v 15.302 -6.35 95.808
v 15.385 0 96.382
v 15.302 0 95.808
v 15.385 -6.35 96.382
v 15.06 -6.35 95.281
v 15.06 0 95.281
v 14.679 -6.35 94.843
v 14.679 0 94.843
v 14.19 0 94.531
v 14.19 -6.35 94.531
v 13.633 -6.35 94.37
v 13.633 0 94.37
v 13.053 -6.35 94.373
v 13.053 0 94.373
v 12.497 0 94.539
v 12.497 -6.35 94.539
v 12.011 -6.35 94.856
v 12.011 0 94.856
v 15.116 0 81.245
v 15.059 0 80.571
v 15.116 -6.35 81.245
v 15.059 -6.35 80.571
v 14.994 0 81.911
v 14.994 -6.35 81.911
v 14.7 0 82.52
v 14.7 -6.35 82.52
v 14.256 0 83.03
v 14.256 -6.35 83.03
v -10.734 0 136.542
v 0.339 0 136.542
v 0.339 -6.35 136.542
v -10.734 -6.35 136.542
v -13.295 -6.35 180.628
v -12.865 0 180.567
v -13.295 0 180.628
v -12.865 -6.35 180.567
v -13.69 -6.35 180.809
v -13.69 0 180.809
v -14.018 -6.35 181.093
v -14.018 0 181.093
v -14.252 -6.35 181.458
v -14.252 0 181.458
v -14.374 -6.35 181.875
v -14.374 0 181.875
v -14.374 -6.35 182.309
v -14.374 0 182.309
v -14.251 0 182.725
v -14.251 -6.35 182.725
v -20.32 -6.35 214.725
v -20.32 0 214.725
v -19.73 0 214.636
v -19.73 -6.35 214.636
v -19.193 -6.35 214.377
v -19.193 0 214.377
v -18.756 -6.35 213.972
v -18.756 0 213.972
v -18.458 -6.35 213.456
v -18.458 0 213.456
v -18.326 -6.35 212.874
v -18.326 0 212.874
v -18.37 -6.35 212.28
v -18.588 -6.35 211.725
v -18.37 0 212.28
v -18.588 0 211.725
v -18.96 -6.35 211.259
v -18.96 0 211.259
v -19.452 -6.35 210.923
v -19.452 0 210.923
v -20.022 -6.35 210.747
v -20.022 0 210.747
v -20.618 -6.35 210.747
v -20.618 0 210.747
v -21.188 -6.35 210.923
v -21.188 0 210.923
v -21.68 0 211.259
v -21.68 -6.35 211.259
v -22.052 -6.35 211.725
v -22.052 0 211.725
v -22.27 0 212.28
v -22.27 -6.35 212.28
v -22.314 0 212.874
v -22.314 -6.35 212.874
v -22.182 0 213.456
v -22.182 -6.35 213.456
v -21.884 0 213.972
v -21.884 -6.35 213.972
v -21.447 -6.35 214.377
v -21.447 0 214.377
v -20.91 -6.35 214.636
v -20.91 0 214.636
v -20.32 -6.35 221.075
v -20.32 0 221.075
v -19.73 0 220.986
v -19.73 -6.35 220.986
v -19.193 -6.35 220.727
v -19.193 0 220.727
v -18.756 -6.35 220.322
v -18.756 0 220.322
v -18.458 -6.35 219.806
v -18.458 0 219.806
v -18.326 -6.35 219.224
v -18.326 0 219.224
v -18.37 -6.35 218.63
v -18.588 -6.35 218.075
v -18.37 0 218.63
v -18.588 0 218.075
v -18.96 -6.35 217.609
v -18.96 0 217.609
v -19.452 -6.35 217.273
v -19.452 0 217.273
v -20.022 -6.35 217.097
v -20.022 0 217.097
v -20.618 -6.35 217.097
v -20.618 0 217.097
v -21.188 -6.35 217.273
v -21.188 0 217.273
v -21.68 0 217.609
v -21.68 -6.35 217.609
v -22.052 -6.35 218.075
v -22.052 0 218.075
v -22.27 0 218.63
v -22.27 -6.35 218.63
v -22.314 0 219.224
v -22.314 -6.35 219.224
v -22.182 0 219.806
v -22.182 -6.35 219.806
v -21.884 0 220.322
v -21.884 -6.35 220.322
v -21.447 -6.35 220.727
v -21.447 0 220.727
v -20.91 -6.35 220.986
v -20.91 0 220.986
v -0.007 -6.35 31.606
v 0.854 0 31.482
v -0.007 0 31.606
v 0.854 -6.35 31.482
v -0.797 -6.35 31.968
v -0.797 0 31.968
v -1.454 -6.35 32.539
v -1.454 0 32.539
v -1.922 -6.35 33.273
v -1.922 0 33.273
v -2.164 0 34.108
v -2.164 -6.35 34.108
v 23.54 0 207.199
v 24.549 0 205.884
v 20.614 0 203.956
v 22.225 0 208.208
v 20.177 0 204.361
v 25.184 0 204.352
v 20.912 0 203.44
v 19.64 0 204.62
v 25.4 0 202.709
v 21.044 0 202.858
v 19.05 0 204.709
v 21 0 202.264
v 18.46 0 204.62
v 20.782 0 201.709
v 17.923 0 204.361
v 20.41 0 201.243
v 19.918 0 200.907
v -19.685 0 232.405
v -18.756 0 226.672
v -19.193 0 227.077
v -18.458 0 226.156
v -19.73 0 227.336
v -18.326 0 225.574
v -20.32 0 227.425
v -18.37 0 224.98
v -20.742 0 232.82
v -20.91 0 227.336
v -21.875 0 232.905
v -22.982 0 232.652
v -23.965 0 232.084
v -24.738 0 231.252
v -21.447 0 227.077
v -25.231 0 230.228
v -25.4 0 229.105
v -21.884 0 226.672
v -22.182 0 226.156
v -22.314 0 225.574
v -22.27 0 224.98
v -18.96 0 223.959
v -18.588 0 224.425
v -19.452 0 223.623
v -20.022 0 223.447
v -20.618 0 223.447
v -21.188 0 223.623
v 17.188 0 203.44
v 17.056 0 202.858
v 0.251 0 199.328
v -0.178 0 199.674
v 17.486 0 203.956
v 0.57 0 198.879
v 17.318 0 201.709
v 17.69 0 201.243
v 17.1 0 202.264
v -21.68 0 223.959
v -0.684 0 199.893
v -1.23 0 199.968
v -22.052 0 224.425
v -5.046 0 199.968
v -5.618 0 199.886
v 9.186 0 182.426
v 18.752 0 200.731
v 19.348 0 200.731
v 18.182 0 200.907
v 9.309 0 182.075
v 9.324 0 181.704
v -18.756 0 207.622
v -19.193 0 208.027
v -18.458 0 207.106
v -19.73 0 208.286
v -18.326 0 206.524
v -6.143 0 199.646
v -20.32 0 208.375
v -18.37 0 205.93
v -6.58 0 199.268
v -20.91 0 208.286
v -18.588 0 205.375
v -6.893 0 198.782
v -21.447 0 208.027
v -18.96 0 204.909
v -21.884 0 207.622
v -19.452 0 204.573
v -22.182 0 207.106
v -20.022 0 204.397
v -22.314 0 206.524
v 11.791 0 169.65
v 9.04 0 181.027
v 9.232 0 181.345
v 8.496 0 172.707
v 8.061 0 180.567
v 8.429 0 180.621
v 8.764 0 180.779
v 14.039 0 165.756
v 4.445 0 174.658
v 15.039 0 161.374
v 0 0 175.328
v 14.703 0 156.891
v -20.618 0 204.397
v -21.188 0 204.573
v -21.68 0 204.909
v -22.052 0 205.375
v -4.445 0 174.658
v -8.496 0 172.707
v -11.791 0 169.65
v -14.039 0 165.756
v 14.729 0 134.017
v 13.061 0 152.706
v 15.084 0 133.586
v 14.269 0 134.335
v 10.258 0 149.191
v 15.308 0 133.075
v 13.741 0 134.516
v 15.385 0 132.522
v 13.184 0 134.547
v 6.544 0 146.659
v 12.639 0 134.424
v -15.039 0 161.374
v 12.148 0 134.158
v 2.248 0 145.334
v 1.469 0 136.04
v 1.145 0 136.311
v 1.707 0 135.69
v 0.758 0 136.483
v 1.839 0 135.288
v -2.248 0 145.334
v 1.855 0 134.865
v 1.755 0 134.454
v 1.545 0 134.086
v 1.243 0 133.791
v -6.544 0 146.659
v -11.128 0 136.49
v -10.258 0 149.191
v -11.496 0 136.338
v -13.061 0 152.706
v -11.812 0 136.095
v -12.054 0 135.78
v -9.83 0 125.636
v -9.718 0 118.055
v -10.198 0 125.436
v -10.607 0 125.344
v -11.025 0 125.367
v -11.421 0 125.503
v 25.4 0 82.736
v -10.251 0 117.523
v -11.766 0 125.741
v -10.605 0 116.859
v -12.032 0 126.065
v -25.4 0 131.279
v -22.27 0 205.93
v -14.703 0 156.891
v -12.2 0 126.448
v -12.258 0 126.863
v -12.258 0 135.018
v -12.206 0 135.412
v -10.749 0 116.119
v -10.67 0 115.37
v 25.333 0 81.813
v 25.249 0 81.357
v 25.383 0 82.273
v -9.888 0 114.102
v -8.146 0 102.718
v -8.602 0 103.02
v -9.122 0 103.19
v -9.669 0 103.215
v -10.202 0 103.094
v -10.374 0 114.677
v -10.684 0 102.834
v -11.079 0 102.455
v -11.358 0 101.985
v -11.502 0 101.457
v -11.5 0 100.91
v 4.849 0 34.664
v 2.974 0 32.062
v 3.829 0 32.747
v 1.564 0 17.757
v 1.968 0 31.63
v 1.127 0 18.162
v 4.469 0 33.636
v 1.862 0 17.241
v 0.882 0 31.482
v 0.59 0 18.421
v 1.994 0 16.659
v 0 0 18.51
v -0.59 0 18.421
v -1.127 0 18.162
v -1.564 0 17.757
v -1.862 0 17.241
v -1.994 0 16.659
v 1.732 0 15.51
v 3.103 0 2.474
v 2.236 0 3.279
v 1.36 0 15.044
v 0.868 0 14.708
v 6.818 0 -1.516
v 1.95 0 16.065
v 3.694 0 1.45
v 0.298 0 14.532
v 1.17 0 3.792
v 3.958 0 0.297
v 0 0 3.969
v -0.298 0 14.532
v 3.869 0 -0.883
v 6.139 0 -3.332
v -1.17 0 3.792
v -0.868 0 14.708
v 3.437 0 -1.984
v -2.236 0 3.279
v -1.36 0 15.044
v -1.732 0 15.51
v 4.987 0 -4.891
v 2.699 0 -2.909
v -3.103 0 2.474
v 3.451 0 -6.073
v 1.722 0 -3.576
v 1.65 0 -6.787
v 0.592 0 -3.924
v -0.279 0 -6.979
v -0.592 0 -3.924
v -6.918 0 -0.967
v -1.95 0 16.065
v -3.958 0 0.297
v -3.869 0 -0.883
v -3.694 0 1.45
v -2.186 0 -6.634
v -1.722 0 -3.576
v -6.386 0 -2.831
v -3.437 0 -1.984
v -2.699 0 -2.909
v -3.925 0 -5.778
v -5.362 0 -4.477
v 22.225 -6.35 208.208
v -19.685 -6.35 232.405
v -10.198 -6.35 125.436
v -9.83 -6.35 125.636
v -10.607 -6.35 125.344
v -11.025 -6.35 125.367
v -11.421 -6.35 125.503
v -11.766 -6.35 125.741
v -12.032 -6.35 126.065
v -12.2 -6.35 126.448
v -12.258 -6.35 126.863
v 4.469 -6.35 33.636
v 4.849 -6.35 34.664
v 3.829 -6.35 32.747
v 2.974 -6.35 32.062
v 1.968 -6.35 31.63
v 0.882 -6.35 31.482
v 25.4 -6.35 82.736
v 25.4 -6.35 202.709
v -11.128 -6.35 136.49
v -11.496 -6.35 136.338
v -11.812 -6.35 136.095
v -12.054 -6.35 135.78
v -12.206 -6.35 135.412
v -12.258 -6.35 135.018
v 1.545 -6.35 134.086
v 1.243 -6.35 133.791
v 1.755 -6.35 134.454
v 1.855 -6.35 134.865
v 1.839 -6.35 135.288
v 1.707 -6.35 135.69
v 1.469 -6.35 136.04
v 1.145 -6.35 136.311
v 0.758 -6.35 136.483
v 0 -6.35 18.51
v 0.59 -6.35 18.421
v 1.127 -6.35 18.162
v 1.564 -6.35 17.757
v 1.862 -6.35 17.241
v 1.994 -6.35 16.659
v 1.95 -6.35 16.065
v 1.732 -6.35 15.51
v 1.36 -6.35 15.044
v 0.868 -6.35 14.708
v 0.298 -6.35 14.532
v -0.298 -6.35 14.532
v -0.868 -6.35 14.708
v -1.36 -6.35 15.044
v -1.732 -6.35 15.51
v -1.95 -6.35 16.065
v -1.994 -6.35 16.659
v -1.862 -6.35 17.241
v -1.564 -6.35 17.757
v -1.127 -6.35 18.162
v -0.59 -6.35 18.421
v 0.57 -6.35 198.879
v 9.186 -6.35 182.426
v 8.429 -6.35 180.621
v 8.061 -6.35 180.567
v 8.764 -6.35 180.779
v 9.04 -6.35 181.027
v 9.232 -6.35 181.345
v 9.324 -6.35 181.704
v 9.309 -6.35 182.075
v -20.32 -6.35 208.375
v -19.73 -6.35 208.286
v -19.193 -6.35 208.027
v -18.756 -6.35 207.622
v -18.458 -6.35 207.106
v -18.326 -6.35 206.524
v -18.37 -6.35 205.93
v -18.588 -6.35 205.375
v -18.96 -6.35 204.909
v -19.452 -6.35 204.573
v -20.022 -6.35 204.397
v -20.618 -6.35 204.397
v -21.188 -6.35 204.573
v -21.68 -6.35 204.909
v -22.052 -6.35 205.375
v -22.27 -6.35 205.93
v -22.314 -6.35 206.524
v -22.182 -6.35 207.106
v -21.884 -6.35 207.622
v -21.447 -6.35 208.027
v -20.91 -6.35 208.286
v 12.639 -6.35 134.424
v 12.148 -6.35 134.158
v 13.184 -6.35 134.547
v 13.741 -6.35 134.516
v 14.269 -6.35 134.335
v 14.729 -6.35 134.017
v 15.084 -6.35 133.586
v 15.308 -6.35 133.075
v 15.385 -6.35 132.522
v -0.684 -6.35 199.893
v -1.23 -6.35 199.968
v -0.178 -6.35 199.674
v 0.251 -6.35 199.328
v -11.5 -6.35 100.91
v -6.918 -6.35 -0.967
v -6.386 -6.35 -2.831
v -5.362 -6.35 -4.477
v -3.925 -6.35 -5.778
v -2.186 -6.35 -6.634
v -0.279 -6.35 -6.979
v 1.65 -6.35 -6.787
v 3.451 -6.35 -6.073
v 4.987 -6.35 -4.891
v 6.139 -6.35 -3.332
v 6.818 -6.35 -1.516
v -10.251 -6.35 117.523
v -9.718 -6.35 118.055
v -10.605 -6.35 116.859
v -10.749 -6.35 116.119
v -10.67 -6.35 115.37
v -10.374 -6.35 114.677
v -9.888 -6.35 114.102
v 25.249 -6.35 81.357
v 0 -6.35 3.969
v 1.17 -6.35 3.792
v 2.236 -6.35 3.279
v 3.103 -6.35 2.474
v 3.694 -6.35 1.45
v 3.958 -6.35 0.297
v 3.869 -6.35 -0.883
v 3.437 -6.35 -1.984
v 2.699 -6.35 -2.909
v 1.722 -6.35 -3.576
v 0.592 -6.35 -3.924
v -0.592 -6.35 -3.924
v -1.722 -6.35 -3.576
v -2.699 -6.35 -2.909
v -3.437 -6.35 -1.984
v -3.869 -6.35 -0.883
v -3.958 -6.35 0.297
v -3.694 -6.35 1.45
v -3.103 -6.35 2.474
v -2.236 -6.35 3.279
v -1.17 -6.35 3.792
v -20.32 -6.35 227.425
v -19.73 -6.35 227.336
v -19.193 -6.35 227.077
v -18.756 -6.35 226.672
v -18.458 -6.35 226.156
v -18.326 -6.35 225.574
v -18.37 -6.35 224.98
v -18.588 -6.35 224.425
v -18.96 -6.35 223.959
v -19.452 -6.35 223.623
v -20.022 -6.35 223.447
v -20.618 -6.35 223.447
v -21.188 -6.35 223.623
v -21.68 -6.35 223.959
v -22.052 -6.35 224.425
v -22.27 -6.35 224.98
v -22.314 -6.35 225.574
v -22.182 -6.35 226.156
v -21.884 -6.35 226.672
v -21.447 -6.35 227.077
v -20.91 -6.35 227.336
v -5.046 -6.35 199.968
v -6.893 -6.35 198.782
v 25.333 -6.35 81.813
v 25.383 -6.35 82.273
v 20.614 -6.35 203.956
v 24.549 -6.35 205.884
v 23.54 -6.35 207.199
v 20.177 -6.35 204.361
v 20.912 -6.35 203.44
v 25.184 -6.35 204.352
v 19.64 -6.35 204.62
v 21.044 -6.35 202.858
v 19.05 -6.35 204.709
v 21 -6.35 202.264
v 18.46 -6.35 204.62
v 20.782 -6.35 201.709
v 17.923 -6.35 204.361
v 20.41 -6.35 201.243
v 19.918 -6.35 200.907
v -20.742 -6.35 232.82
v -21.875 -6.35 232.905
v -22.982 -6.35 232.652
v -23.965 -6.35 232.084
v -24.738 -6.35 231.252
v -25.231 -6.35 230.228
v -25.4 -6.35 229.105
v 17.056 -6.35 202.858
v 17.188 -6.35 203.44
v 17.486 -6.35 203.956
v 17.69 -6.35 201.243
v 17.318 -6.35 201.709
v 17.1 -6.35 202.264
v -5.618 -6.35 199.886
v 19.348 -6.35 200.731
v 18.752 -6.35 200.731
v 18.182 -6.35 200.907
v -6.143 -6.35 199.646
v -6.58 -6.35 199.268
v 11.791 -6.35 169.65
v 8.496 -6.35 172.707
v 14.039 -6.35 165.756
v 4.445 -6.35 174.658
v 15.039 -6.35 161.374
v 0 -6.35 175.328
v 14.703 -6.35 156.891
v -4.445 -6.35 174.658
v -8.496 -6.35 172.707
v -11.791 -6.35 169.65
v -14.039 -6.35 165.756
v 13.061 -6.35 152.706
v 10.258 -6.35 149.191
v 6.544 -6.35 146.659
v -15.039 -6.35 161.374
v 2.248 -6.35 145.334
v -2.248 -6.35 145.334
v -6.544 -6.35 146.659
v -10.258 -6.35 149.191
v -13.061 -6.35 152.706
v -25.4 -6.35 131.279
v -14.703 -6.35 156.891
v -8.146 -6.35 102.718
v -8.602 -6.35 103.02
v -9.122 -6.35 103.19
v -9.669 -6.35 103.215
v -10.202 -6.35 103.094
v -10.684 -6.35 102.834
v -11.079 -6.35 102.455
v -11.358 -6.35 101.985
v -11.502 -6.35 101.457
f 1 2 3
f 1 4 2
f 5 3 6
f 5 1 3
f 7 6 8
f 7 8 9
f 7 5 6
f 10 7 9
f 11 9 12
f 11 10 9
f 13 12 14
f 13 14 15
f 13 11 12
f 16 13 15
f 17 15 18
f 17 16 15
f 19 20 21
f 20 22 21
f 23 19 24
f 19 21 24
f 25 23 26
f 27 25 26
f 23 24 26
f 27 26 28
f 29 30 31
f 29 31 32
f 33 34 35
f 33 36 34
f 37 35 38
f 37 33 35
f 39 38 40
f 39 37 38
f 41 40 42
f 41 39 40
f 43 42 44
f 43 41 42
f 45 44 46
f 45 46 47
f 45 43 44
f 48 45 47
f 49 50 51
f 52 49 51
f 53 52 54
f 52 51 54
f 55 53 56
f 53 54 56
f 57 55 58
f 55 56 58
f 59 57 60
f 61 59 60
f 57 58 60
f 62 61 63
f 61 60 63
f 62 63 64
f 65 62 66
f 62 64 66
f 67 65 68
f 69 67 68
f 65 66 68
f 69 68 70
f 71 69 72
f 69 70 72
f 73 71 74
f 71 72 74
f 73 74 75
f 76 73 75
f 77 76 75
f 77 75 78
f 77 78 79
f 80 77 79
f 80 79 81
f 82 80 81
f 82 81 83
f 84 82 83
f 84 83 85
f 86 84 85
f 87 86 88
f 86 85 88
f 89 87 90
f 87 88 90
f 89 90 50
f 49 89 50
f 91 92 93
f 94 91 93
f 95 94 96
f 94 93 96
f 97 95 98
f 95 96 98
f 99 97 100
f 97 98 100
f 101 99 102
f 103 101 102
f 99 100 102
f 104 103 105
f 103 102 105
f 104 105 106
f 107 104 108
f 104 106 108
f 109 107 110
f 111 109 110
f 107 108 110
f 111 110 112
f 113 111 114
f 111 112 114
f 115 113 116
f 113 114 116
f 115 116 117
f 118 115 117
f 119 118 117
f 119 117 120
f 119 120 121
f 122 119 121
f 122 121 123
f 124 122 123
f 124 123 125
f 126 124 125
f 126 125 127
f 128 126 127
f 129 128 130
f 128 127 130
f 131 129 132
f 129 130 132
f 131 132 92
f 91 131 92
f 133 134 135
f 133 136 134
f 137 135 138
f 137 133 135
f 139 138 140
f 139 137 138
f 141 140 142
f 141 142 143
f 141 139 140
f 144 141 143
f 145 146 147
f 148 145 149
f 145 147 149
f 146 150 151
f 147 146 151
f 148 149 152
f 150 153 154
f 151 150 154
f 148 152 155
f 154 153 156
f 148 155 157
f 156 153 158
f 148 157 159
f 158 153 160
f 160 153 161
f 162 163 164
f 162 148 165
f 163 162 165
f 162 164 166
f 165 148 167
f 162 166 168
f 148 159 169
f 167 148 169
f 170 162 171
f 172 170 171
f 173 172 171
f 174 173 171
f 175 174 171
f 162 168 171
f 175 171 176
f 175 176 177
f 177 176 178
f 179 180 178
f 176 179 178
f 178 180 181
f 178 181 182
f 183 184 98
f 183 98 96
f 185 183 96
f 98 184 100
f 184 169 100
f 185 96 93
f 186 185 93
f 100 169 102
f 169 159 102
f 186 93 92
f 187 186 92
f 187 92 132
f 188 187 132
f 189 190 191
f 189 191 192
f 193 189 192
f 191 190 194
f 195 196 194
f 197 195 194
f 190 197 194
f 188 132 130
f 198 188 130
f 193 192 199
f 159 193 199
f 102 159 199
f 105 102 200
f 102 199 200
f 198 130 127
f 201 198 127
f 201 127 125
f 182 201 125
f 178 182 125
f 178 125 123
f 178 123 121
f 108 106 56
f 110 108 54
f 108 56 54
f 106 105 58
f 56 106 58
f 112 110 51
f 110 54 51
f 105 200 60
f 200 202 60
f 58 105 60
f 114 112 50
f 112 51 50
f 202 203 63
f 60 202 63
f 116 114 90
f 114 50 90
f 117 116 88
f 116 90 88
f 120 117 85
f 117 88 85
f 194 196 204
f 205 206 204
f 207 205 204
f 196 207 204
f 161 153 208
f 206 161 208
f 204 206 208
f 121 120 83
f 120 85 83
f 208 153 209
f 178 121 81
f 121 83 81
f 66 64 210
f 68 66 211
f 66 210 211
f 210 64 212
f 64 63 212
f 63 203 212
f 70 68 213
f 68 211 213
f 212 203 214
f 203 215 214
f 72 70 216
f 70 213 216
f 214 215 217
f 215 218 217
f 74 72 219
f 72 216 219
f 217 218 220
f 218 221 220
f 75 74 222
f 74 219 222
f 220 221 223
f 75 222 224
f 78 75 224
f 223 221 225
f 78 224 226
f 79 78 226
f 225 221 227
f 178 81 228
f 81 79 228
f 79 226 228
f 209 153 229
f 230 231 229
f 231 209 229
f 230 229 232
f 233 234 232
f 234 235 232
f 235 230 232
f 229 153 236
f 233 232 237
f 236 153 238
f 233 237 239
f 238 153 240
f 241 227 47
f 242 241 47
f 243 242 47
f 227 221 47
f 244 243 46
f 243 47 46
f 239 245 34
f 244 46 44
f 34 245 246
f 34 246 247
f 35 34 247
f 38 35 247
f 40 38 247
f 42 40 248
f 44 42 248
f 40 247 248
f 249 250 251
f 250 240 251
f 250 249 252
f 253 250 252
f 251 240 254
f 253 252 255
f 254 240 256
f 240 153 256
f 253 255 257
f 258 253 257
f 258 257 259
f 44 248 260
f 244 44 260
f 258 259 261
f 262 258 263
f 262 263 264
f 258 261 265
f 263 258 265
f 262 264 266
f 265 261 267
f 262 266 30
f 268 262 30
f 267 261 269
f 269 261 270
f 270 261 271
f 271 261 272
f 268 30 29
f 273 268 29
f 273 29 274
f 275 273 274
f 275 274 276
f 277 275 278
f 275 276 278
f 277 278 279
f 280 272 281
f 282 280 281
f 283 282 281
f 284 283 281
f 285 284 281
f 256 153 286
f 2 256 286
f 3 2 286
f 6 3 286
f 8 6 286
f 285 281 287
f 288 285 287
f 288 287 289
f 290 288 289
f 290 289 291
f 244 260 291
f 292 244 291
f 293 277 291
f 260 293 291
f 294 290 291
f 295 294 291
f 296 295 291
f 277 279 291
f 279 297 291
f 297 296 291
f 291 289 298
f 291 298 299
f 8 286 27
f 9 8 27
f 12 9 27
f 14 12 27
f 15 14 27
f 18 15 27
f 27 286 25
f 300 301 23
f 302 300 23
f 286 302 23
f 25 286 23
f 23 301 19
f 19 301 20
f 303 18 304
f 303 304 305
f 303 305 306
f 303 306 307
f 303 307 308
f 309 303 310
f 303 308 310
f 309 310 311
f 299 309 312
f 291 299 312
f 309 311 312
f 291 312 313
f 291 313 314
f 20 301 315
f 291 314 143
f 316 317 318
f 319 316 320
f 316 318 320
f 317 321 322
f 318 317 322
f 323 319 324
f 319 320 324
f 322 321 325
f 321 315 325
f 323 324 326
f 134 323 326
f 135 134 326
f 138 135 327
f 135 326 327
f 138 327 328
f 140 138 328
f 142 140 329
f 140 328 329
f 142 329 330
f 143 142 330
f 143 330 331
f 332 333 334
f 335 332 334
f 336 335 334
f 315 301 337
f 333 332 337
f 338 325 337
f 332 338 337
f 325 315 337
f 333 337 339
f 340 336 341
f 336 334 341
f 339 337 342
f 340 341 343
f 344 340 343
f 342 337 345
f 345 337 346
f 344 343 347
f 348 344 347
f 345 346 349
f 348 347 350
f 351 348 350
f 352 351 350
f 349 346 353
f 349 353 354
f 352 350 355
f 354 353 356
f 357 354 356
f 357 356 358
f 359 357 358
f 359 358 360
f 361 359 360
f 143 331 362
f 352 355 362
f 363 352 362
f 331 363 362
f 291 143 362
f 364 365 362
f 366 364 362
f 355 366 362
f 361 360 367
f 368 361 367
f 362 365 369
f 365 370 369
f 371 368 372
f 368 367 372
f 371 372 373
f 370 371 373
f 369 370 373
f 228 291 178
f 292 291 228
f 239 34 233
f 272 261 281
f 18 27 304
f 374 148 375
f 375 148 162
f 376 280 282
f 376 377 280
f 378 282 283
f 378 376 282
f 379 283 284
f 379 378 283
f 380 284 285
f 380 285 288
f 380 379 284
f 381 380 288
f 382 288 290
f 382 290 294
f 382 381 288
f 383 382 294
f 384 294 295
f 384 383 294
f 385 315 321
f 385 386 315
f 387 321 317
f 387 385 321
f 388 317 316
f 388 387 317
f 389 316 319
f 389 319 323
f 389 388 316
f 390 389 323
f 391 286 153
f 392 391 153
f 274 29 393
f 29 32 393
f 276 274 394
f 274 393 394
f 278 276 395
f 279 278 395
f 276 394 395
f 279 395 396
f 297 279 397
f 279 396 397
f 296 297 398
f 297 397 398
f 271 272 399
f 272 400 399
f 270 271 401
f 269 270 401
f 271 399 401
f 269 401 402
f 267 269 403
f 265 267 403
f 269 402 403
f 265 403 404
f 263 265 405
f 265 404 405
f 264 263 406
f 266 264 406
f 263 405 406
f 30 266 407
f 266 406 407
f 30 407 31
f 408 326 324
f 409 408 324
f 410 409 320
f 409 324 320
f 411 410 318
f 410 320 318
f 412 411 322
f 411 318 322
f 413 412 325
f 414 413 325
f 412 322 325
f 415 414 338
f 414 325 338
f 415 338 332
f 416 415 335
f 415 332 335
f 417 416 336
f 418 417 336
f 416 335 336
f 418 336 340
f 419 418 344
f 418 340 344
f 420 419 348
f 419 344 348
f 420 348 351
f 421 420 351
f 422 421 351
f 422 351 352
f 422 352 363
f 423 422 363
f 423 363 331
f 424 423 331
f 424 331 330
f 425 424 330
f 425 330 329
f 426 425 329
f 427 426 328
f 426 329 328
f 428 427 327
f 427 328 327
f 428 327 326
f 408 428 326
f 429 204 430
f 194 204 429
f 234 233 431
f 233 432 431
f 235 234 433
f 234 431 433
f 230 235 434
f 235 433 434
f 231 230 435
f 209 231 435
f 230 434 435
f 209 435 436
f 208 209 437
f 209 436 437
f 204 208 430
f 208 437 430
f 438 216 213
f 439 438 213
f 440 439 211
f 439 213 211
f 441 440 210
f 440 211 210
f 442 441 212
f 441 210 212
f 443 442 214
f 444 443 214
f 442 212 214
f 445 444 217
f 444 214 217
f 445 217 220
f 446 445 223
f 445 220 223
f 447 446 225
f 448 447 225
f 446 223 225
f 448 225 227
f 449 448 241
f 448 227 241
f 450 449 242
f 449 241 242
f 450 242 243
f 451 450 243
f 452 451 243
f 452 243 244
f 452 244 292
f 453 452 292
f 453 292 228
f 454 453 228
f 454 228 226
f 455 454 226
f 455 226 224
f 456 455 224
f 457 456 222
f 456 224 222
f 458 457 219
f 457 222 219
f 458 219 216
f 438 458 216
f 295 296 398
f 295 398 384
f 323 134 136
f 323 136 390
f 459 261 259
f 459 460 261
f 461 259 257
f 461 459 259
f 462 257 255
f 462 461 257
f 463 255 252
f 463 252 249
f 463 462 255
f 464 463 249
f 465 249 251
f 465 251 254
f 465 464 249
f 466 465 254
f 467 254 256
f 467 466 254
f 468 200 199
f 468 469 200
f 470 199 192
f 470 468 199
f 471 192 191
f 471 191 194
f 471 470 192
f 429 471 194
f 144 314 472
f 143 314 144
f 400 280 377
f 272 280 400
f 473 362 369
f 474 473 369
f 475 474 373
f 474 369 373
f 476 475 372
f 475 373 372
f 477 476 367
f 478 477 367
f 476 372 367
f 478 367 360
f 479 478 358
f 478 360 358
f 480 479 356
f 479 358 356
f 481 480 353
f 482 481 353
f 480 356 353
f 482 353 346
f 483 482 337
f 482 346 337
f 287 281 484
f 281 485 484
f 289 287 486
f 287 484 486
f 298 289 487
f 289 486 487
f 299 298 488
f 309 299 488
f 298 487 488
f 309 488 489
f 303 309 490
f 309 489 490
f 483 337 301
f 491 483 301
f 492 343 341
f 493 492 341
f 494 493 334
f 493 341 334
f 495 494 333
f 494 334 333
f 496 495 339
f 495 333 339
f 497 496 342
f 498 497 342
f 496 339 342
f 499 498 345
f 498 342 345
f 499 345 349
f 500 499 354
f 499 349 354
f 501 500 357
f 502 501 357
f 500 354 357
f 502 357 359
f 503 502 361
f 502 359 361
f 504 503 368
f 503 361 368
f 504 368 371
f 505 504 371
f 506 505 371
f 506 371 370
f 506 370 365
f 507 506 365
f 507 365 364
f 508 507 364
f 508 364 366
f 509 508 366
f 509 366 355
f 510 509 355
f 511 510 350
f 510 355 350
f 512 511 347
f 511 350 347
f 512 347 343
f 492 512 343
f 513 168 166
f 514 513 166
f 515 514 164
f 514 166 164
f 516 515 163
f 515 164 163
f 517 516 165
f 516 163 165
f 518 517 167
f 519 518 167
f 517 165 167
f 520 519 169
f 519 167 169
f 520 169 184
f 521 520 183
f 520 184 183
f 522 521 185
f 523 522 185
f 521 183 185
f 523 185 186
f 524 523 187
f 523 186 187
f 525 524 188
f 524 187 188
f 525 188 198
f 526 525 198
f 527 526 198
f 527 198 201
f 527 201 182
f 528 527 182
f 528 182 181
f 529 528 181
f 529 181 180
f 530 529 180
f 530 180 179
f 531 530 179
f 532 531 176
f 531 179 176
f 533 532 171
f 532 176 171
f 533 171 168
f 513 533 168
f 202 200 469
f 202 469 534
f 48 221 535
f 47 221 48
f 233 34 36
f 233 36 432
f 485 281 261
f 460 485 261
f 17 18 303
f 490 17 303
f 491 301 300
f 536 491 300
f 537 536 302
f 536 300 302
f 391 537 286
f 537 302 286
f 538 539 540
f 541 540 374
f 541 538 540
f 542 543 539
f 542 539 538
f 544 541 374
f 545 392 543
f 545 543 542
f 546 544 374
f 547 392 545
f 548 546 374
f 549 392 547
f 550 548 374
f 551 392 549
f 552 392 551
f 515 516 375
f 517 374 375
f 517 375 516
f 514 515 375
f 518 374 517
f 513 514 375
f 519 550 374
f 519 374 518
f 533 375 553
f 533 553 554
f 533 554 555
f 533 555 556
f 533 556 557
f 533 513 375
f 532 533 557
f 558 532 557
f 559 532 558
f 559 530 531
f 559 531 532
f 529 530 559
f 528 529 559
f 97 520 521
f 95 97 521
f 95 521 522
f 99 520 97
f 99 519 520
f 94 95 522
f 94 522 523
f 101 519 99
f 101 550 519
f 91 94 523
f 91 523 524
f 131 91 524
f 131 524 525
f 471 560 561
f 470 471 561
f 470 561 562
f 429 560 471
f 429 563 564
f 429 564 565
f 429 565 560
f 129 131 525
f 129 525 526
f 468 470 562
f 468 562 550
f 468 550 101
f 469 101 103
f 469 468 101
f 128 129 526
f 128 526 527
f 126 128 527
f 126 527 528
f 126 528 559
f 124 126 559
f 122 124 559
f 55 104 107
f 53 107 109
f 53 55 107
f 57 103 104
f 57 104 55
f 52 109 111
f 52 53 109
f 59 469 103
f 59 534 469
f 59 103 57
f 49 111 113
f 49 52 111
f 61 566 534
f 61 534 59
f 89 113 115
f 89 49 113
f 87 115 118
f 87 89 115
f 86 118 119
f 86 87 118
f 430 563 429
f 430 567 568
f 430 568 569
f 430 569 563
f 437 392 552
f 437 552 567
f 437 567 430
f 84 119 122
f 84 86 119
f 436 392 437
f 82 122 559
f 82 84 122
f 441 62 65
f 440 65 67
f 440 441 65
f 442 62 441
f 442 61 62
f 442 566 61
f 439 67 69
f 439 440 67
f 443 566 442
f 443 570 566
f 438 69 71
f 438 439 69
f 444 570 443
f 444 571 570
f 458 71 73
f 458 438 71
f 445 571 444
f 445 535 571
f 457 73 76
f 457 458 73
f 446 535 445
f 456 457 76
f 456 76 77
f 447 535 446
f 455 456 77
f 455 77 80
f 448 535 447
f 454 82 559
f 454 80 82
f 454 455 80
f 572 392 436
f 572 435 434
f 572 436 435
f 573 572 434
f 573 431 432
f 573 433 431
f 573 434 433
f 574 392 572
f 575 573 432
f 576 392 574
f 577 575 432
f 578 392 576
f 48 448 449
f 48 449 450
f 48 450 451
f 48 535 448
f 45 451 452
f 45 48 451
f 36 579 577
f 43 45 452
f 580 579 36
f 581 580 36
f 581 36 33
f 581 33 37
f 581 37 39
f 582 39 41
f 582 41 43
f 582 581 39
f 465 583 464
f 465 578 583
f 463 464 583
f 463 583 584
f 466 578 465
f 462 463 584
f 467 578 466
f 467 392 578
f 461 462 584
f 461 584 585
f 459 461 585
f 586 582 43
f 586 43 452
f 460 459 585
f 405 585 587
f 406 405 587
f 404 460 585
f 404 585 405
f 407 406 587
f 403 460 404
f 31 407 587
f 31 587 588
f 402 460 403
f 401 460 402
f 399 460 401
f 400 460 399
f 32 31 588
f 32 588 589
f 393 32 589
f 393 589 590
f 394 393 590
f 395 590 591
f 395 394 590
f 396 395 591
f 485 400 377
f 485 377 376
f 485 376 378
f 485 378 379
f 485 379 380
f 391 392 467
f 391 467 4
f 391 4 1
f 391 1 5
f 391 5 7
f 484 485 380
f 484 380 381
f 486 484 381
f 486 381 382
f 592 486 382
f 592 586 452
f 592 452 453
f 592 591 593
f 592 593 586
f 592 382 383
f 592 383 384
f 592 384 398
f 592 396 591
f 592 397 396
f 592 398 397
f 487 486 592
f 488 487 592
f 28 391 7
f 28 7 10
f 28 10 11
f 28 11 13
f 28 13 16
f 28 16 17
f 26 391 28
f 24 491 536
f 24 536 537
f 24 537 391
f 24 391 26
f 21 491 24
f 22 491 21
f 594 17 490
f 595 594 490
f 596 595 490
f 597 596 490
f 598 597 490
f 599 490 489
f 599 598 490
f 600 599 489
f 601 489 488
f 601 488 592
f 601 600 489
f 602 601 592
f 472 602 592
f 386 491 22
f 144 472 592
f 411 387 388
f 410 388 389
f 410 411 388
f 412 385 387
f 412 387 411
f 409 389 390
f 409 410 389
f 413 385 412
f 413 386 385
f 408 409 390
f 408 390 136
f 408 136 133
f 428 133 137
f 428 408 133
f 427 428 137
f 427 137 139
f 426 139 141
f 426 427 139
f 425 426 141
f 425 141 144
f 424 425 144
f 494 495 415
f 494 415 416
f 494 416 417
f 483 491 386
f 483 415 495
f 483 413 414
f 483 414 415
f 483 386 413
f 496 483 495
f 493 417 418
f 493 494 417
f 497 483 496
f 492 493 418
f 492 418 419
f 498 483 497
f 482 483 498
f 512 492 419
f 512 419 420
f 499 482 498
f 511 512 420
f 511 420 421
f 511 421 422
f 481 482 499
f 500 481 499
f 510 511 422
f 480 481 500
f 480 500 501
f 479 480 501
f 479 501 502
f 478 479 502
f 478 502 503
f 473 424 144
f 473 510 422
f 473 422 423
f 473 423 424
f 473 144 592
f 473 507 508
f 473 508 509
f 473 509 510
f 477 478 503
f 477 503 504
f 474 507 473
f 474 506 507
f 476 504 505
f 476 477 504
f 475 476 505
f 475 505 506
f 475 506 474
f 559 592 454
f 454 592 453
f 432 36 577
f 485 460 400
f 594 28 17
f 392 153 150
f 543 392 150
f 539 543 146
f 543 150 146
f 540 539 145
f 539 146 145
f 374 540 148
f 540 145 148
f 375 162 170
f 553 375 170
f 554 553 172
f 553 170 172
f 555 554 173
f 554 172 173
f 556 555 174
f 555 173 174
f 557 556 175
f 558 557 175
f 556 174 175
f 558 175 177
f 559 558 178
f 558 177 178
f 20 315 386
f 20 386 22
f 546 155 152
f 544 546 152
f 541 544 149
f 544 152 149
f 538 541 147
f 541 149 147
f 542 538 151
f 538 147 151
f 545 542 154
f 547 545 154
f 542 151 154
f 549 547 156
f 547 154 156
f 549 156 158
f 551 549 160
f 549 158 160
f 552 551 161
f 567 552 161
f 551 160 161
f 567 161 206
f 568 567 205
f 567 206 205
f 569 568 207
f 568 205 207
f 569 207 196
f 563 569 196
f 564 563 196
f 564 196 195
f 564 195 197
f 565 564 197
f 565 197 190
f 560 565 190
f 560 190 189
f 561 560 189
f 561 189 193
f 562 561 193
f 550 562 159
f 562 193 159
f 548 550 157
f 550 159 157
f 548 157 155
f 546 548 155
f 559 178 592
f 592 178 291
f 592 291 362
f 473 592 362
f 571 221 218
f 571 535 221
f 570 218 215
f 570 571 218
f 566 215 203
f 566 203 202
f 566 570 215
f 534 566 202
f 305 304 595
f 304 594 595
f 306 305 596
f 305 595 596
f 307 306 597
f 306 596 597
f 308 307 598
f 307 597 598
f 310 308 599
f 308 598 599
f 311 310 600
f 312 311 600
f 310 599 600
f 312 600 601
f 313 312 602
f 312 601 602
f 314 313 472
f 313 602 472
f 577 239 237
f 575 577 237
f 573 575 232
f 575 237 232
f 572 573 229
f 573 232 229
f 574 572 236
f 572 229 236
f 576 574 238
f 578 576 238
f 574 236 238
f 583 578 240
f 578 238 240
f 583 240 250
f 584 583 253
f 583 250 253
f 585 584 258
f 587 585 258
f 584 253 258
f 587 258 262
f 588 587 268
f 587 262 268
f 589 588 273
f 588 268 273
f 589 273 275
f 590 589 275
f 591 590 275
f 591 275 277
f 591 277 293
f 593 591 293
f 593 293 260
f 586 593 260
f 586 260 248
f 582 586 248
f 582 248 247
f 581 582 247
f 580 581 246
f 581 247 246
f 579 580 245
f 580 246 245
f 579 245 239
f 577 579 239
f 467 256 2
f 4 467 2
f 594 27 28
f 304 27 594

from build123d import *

# Parameters (mm, degrees)
SKETCH1_R           = 3.96875
SKETCH1_R_2         = 15.08125
SKETCH1_R_3         = 2
BOSS_EXTRUDE1_DEPTH = 6.35
FILLET5_R           = 4.064
FILLET6_R           = 3.048
FILLET7_R           = 2.54
FILLET8_R           = 2.032
FILLET9_R           = 2.032
FILLET10_R          = 2.54
FILLET11_R          = 2.032
FILLET12_R          = 1.524
FILLET13_R          = 1.524
FILLET14_R          = 1.524
FILLET17_R          = 1.27
FILLET18_R          = 1.524
FILLET19_R          = 2.032
FILLET20_R          = 2.032


with BuildPart() as part:
    # Sketch1 → Boss-Extrude1 (new body)
    with BuildSketch(Plane(origin=(0, 0, 0), x_dir=(1, 0, 0), z_dir=(0, 1, 0))):
        with BuildLine():
            Line((25.4, -82.735721877), (25.4, -202.708825791))
            ThreePointArc((25.4, -202.708825791), (24.549261314, -205.883825791), (22.225, -208.208087105))
            Line((22.225, -208.208087105), (-19.685, -232.404836886))
            ThreePointArc((-19.685, -232.404836886), (-23.495, -232.404836886), (-25.4, -229.105280098))
            Line((-25.4, -229.105280098), (-25.4, -131.278691098))
            Line((-25.4, -131.278691098), (-6.917767735, 0.966806375))
            ThreePointArc((-6.917767735, 0.966806375), (-0.279220673, 6.97941694), (6.818426198, 1.51634072))
            Line((6.818426198, 1.51634072), (25.248569271, -81.357230313))
            ThreePointArc((25.248569271, -81.357230313), (25.362028789, -82.042329806), (25.4, -82.735721877))
        make_face()
        with Locations(Location((0, 0, 0), (0, 0, 270))):
            Circle(SKETCH1_R, mode=Mode.SUBTRACT)
        with Locations(Location((0, -160.246508934, 0), (0, 0, 270))):
            Circle(SKETCH1_R_2, mode=Mode.SUBTRACT)
        with Locations(Location((-20.32, -225.425, 0), (0, 0, 270))):
            Circle(SKETCH1_R_3, mode=Mode.SUBTRACT)
        with Locations(Location((-20.32, -219.075, 0), (0, 0, 270))):
            Circle(SKETCH1_R_3, mode=Mode.SUBTRACT)
        with Locations(Location((-20.32, -212.725, 0), (0, 0, 270))):
            Circle(SKETCH1_R_3, mode=Mode.SUBTRACT)
        with Locations(Location((-20.32, -206.375, 0), (0, 0, 270))):
            Circle(SKETCH1_R_3, mode=Mode.SUBTRACT)
        with Locations(Location((0, -16.51, 0), (0, 0, 270))):
            Circle(SKETCH1_R_3, mode=Mode.SUBTRACT)
        with Locations(Location((19.05, -202.708825791, 0), (0, 0, 270))):
            Circle(SKETCH1_R_3, mode=Mode.SUBTRACT)
        Polygon((4.14169212, -31.481995576), (15.384809867, -82.038158574), (-12.257886656, -106.330908852), (-1.797228059, -31.481995576), (0, -31.481995576), align=None, mode=Mode.SUBTRACT)
        Polygon((15.384809867, -91.891539471), (-12.257886656, -116.184289749), (15.384809867, -136.541766952), align=None, mode=Mode.SUBTRACT)
        Polygon((-12.257886656, -123.848026735), (4.97849313, -136.541766952), (-12.257886656, -136.541766952), align=None, mode=Mode.SUBTRACT)
        Polygon((-15.24, -180.566508934), (10.16, -180.566508934), (0, -199.967922148), (-6.35, -199.967922148), align=None, mode=Mode.SUBTRACT)
    extrude(amount=-BOSS_EXTRUDE1_DEPTH)

    # Fillet5
    fillet5_edges = [part.edges().sort_by_distance(p)[0] for p in [
        (4.14169212, -3.175, 31.481995576),
    ]]
    fillet(fillet5_edges, radius=FILLET5_R)

    # Fillet6
    fillet6_edges = [part.edges().sort_by_distance(p)[0] for p in [
        (-1.797228059, -3.175, 31.481995576),
    ]]
    fillet(fillet6_edges, radius=FILLET6_R)

    # Fillet7
    fillet7_edges = [part.edges().sort_by_distance(p)[0] for p in [
        (15.384809867, -3.175, 82.038158574),
    ]]
    fillet(fillet7_edges, radius=FILLET7_R)

    # Fillet8
    fillet8_edges = [part.edges().sort_by_distance(p)[0] for p in [
        (-12.257886656, -3.175, 106.330908852),
    ]]
    fillet(fillet8_edges, radius=FILLET8_R)

    # Fillet9
    fillet9_edges = [part.edges().sort_by_distance(p)[0] for p in [
        (15.384809867, -3.175, 91.891539471),
    ]]
    fillet(fillet9_edges, radius=FILLET9_R)

    # Fillet10
    fillet10_edges = [part.edges().sort_by_distance(p)[0] for p in [
        (-12.257886656, -3.175, 116.184289749),
    ]]
    fillet(fillet10_edges, radius=FILLET10_R)

    # Fillet11
    fillet11_edges = [part.edges().sort_by_distance(p)[0] for p in [
        (15.384809867, -3.175, 136.541766952),
    ]]
    fillet(fillet11_edges, radius=FILLET11_R)

    # Fillet12
    fillet12_edges = [part.edges().sort_by_distance(p)[0] for p in [
        (-12.257886656, -3.175, 123.848026735),
    ]]
    fillet(fillet12_edges, radius=FILLET12_R)

    # Fillet13
    fillet13_edges = [part.edges().sort_by_distance(p)[0] for p in [
        (4.97849313, -3.175, 136.541766952),
    ]]
    fillet(fillet13_edges, radius=FILLET13_R)

    # Fillet14
    fillet14_edges = [part.edges().sort_by_distance(p)[0] for p in [
        (-12.257886656, -3.175, 136.541766952),
    ]]
    fillet(fillet14_edges, radius=FILLET14_R)

    # Fillet17
    fillet17_edges = [part.edges().sort_by_distance(p)[0] for p in [
        (10.16, -3.175, 180.566508934),
    ]]
    fillet(fillet17_edges, radius=FILLET17_R)

    # Fillet18
    fillet18_edges = [part.edges().sort_by_distance(p)[0] for p in [
        (-15.24, -3.175, 180.566508934),
    ]]
    fillet(fillet18_edges, radius=FILLET18_R)

    # Fillet19
    fillet19_edges = [part.edges().sort_by_distance(p)[0] for p in [
        (-6.35, -3.175, 199.967922148),
    ]]
    fillet(fillet19_edges, radius=FILLET19_R)

    # Fillet20
    fillet20_edges = [part.edges().sort_by_distance(p)[0] for p in [
        (0, -3.175, 199.967922148),
    ]]
    fillet(fillet20_edges, radius=FILLET20_R)


solid = part.part
